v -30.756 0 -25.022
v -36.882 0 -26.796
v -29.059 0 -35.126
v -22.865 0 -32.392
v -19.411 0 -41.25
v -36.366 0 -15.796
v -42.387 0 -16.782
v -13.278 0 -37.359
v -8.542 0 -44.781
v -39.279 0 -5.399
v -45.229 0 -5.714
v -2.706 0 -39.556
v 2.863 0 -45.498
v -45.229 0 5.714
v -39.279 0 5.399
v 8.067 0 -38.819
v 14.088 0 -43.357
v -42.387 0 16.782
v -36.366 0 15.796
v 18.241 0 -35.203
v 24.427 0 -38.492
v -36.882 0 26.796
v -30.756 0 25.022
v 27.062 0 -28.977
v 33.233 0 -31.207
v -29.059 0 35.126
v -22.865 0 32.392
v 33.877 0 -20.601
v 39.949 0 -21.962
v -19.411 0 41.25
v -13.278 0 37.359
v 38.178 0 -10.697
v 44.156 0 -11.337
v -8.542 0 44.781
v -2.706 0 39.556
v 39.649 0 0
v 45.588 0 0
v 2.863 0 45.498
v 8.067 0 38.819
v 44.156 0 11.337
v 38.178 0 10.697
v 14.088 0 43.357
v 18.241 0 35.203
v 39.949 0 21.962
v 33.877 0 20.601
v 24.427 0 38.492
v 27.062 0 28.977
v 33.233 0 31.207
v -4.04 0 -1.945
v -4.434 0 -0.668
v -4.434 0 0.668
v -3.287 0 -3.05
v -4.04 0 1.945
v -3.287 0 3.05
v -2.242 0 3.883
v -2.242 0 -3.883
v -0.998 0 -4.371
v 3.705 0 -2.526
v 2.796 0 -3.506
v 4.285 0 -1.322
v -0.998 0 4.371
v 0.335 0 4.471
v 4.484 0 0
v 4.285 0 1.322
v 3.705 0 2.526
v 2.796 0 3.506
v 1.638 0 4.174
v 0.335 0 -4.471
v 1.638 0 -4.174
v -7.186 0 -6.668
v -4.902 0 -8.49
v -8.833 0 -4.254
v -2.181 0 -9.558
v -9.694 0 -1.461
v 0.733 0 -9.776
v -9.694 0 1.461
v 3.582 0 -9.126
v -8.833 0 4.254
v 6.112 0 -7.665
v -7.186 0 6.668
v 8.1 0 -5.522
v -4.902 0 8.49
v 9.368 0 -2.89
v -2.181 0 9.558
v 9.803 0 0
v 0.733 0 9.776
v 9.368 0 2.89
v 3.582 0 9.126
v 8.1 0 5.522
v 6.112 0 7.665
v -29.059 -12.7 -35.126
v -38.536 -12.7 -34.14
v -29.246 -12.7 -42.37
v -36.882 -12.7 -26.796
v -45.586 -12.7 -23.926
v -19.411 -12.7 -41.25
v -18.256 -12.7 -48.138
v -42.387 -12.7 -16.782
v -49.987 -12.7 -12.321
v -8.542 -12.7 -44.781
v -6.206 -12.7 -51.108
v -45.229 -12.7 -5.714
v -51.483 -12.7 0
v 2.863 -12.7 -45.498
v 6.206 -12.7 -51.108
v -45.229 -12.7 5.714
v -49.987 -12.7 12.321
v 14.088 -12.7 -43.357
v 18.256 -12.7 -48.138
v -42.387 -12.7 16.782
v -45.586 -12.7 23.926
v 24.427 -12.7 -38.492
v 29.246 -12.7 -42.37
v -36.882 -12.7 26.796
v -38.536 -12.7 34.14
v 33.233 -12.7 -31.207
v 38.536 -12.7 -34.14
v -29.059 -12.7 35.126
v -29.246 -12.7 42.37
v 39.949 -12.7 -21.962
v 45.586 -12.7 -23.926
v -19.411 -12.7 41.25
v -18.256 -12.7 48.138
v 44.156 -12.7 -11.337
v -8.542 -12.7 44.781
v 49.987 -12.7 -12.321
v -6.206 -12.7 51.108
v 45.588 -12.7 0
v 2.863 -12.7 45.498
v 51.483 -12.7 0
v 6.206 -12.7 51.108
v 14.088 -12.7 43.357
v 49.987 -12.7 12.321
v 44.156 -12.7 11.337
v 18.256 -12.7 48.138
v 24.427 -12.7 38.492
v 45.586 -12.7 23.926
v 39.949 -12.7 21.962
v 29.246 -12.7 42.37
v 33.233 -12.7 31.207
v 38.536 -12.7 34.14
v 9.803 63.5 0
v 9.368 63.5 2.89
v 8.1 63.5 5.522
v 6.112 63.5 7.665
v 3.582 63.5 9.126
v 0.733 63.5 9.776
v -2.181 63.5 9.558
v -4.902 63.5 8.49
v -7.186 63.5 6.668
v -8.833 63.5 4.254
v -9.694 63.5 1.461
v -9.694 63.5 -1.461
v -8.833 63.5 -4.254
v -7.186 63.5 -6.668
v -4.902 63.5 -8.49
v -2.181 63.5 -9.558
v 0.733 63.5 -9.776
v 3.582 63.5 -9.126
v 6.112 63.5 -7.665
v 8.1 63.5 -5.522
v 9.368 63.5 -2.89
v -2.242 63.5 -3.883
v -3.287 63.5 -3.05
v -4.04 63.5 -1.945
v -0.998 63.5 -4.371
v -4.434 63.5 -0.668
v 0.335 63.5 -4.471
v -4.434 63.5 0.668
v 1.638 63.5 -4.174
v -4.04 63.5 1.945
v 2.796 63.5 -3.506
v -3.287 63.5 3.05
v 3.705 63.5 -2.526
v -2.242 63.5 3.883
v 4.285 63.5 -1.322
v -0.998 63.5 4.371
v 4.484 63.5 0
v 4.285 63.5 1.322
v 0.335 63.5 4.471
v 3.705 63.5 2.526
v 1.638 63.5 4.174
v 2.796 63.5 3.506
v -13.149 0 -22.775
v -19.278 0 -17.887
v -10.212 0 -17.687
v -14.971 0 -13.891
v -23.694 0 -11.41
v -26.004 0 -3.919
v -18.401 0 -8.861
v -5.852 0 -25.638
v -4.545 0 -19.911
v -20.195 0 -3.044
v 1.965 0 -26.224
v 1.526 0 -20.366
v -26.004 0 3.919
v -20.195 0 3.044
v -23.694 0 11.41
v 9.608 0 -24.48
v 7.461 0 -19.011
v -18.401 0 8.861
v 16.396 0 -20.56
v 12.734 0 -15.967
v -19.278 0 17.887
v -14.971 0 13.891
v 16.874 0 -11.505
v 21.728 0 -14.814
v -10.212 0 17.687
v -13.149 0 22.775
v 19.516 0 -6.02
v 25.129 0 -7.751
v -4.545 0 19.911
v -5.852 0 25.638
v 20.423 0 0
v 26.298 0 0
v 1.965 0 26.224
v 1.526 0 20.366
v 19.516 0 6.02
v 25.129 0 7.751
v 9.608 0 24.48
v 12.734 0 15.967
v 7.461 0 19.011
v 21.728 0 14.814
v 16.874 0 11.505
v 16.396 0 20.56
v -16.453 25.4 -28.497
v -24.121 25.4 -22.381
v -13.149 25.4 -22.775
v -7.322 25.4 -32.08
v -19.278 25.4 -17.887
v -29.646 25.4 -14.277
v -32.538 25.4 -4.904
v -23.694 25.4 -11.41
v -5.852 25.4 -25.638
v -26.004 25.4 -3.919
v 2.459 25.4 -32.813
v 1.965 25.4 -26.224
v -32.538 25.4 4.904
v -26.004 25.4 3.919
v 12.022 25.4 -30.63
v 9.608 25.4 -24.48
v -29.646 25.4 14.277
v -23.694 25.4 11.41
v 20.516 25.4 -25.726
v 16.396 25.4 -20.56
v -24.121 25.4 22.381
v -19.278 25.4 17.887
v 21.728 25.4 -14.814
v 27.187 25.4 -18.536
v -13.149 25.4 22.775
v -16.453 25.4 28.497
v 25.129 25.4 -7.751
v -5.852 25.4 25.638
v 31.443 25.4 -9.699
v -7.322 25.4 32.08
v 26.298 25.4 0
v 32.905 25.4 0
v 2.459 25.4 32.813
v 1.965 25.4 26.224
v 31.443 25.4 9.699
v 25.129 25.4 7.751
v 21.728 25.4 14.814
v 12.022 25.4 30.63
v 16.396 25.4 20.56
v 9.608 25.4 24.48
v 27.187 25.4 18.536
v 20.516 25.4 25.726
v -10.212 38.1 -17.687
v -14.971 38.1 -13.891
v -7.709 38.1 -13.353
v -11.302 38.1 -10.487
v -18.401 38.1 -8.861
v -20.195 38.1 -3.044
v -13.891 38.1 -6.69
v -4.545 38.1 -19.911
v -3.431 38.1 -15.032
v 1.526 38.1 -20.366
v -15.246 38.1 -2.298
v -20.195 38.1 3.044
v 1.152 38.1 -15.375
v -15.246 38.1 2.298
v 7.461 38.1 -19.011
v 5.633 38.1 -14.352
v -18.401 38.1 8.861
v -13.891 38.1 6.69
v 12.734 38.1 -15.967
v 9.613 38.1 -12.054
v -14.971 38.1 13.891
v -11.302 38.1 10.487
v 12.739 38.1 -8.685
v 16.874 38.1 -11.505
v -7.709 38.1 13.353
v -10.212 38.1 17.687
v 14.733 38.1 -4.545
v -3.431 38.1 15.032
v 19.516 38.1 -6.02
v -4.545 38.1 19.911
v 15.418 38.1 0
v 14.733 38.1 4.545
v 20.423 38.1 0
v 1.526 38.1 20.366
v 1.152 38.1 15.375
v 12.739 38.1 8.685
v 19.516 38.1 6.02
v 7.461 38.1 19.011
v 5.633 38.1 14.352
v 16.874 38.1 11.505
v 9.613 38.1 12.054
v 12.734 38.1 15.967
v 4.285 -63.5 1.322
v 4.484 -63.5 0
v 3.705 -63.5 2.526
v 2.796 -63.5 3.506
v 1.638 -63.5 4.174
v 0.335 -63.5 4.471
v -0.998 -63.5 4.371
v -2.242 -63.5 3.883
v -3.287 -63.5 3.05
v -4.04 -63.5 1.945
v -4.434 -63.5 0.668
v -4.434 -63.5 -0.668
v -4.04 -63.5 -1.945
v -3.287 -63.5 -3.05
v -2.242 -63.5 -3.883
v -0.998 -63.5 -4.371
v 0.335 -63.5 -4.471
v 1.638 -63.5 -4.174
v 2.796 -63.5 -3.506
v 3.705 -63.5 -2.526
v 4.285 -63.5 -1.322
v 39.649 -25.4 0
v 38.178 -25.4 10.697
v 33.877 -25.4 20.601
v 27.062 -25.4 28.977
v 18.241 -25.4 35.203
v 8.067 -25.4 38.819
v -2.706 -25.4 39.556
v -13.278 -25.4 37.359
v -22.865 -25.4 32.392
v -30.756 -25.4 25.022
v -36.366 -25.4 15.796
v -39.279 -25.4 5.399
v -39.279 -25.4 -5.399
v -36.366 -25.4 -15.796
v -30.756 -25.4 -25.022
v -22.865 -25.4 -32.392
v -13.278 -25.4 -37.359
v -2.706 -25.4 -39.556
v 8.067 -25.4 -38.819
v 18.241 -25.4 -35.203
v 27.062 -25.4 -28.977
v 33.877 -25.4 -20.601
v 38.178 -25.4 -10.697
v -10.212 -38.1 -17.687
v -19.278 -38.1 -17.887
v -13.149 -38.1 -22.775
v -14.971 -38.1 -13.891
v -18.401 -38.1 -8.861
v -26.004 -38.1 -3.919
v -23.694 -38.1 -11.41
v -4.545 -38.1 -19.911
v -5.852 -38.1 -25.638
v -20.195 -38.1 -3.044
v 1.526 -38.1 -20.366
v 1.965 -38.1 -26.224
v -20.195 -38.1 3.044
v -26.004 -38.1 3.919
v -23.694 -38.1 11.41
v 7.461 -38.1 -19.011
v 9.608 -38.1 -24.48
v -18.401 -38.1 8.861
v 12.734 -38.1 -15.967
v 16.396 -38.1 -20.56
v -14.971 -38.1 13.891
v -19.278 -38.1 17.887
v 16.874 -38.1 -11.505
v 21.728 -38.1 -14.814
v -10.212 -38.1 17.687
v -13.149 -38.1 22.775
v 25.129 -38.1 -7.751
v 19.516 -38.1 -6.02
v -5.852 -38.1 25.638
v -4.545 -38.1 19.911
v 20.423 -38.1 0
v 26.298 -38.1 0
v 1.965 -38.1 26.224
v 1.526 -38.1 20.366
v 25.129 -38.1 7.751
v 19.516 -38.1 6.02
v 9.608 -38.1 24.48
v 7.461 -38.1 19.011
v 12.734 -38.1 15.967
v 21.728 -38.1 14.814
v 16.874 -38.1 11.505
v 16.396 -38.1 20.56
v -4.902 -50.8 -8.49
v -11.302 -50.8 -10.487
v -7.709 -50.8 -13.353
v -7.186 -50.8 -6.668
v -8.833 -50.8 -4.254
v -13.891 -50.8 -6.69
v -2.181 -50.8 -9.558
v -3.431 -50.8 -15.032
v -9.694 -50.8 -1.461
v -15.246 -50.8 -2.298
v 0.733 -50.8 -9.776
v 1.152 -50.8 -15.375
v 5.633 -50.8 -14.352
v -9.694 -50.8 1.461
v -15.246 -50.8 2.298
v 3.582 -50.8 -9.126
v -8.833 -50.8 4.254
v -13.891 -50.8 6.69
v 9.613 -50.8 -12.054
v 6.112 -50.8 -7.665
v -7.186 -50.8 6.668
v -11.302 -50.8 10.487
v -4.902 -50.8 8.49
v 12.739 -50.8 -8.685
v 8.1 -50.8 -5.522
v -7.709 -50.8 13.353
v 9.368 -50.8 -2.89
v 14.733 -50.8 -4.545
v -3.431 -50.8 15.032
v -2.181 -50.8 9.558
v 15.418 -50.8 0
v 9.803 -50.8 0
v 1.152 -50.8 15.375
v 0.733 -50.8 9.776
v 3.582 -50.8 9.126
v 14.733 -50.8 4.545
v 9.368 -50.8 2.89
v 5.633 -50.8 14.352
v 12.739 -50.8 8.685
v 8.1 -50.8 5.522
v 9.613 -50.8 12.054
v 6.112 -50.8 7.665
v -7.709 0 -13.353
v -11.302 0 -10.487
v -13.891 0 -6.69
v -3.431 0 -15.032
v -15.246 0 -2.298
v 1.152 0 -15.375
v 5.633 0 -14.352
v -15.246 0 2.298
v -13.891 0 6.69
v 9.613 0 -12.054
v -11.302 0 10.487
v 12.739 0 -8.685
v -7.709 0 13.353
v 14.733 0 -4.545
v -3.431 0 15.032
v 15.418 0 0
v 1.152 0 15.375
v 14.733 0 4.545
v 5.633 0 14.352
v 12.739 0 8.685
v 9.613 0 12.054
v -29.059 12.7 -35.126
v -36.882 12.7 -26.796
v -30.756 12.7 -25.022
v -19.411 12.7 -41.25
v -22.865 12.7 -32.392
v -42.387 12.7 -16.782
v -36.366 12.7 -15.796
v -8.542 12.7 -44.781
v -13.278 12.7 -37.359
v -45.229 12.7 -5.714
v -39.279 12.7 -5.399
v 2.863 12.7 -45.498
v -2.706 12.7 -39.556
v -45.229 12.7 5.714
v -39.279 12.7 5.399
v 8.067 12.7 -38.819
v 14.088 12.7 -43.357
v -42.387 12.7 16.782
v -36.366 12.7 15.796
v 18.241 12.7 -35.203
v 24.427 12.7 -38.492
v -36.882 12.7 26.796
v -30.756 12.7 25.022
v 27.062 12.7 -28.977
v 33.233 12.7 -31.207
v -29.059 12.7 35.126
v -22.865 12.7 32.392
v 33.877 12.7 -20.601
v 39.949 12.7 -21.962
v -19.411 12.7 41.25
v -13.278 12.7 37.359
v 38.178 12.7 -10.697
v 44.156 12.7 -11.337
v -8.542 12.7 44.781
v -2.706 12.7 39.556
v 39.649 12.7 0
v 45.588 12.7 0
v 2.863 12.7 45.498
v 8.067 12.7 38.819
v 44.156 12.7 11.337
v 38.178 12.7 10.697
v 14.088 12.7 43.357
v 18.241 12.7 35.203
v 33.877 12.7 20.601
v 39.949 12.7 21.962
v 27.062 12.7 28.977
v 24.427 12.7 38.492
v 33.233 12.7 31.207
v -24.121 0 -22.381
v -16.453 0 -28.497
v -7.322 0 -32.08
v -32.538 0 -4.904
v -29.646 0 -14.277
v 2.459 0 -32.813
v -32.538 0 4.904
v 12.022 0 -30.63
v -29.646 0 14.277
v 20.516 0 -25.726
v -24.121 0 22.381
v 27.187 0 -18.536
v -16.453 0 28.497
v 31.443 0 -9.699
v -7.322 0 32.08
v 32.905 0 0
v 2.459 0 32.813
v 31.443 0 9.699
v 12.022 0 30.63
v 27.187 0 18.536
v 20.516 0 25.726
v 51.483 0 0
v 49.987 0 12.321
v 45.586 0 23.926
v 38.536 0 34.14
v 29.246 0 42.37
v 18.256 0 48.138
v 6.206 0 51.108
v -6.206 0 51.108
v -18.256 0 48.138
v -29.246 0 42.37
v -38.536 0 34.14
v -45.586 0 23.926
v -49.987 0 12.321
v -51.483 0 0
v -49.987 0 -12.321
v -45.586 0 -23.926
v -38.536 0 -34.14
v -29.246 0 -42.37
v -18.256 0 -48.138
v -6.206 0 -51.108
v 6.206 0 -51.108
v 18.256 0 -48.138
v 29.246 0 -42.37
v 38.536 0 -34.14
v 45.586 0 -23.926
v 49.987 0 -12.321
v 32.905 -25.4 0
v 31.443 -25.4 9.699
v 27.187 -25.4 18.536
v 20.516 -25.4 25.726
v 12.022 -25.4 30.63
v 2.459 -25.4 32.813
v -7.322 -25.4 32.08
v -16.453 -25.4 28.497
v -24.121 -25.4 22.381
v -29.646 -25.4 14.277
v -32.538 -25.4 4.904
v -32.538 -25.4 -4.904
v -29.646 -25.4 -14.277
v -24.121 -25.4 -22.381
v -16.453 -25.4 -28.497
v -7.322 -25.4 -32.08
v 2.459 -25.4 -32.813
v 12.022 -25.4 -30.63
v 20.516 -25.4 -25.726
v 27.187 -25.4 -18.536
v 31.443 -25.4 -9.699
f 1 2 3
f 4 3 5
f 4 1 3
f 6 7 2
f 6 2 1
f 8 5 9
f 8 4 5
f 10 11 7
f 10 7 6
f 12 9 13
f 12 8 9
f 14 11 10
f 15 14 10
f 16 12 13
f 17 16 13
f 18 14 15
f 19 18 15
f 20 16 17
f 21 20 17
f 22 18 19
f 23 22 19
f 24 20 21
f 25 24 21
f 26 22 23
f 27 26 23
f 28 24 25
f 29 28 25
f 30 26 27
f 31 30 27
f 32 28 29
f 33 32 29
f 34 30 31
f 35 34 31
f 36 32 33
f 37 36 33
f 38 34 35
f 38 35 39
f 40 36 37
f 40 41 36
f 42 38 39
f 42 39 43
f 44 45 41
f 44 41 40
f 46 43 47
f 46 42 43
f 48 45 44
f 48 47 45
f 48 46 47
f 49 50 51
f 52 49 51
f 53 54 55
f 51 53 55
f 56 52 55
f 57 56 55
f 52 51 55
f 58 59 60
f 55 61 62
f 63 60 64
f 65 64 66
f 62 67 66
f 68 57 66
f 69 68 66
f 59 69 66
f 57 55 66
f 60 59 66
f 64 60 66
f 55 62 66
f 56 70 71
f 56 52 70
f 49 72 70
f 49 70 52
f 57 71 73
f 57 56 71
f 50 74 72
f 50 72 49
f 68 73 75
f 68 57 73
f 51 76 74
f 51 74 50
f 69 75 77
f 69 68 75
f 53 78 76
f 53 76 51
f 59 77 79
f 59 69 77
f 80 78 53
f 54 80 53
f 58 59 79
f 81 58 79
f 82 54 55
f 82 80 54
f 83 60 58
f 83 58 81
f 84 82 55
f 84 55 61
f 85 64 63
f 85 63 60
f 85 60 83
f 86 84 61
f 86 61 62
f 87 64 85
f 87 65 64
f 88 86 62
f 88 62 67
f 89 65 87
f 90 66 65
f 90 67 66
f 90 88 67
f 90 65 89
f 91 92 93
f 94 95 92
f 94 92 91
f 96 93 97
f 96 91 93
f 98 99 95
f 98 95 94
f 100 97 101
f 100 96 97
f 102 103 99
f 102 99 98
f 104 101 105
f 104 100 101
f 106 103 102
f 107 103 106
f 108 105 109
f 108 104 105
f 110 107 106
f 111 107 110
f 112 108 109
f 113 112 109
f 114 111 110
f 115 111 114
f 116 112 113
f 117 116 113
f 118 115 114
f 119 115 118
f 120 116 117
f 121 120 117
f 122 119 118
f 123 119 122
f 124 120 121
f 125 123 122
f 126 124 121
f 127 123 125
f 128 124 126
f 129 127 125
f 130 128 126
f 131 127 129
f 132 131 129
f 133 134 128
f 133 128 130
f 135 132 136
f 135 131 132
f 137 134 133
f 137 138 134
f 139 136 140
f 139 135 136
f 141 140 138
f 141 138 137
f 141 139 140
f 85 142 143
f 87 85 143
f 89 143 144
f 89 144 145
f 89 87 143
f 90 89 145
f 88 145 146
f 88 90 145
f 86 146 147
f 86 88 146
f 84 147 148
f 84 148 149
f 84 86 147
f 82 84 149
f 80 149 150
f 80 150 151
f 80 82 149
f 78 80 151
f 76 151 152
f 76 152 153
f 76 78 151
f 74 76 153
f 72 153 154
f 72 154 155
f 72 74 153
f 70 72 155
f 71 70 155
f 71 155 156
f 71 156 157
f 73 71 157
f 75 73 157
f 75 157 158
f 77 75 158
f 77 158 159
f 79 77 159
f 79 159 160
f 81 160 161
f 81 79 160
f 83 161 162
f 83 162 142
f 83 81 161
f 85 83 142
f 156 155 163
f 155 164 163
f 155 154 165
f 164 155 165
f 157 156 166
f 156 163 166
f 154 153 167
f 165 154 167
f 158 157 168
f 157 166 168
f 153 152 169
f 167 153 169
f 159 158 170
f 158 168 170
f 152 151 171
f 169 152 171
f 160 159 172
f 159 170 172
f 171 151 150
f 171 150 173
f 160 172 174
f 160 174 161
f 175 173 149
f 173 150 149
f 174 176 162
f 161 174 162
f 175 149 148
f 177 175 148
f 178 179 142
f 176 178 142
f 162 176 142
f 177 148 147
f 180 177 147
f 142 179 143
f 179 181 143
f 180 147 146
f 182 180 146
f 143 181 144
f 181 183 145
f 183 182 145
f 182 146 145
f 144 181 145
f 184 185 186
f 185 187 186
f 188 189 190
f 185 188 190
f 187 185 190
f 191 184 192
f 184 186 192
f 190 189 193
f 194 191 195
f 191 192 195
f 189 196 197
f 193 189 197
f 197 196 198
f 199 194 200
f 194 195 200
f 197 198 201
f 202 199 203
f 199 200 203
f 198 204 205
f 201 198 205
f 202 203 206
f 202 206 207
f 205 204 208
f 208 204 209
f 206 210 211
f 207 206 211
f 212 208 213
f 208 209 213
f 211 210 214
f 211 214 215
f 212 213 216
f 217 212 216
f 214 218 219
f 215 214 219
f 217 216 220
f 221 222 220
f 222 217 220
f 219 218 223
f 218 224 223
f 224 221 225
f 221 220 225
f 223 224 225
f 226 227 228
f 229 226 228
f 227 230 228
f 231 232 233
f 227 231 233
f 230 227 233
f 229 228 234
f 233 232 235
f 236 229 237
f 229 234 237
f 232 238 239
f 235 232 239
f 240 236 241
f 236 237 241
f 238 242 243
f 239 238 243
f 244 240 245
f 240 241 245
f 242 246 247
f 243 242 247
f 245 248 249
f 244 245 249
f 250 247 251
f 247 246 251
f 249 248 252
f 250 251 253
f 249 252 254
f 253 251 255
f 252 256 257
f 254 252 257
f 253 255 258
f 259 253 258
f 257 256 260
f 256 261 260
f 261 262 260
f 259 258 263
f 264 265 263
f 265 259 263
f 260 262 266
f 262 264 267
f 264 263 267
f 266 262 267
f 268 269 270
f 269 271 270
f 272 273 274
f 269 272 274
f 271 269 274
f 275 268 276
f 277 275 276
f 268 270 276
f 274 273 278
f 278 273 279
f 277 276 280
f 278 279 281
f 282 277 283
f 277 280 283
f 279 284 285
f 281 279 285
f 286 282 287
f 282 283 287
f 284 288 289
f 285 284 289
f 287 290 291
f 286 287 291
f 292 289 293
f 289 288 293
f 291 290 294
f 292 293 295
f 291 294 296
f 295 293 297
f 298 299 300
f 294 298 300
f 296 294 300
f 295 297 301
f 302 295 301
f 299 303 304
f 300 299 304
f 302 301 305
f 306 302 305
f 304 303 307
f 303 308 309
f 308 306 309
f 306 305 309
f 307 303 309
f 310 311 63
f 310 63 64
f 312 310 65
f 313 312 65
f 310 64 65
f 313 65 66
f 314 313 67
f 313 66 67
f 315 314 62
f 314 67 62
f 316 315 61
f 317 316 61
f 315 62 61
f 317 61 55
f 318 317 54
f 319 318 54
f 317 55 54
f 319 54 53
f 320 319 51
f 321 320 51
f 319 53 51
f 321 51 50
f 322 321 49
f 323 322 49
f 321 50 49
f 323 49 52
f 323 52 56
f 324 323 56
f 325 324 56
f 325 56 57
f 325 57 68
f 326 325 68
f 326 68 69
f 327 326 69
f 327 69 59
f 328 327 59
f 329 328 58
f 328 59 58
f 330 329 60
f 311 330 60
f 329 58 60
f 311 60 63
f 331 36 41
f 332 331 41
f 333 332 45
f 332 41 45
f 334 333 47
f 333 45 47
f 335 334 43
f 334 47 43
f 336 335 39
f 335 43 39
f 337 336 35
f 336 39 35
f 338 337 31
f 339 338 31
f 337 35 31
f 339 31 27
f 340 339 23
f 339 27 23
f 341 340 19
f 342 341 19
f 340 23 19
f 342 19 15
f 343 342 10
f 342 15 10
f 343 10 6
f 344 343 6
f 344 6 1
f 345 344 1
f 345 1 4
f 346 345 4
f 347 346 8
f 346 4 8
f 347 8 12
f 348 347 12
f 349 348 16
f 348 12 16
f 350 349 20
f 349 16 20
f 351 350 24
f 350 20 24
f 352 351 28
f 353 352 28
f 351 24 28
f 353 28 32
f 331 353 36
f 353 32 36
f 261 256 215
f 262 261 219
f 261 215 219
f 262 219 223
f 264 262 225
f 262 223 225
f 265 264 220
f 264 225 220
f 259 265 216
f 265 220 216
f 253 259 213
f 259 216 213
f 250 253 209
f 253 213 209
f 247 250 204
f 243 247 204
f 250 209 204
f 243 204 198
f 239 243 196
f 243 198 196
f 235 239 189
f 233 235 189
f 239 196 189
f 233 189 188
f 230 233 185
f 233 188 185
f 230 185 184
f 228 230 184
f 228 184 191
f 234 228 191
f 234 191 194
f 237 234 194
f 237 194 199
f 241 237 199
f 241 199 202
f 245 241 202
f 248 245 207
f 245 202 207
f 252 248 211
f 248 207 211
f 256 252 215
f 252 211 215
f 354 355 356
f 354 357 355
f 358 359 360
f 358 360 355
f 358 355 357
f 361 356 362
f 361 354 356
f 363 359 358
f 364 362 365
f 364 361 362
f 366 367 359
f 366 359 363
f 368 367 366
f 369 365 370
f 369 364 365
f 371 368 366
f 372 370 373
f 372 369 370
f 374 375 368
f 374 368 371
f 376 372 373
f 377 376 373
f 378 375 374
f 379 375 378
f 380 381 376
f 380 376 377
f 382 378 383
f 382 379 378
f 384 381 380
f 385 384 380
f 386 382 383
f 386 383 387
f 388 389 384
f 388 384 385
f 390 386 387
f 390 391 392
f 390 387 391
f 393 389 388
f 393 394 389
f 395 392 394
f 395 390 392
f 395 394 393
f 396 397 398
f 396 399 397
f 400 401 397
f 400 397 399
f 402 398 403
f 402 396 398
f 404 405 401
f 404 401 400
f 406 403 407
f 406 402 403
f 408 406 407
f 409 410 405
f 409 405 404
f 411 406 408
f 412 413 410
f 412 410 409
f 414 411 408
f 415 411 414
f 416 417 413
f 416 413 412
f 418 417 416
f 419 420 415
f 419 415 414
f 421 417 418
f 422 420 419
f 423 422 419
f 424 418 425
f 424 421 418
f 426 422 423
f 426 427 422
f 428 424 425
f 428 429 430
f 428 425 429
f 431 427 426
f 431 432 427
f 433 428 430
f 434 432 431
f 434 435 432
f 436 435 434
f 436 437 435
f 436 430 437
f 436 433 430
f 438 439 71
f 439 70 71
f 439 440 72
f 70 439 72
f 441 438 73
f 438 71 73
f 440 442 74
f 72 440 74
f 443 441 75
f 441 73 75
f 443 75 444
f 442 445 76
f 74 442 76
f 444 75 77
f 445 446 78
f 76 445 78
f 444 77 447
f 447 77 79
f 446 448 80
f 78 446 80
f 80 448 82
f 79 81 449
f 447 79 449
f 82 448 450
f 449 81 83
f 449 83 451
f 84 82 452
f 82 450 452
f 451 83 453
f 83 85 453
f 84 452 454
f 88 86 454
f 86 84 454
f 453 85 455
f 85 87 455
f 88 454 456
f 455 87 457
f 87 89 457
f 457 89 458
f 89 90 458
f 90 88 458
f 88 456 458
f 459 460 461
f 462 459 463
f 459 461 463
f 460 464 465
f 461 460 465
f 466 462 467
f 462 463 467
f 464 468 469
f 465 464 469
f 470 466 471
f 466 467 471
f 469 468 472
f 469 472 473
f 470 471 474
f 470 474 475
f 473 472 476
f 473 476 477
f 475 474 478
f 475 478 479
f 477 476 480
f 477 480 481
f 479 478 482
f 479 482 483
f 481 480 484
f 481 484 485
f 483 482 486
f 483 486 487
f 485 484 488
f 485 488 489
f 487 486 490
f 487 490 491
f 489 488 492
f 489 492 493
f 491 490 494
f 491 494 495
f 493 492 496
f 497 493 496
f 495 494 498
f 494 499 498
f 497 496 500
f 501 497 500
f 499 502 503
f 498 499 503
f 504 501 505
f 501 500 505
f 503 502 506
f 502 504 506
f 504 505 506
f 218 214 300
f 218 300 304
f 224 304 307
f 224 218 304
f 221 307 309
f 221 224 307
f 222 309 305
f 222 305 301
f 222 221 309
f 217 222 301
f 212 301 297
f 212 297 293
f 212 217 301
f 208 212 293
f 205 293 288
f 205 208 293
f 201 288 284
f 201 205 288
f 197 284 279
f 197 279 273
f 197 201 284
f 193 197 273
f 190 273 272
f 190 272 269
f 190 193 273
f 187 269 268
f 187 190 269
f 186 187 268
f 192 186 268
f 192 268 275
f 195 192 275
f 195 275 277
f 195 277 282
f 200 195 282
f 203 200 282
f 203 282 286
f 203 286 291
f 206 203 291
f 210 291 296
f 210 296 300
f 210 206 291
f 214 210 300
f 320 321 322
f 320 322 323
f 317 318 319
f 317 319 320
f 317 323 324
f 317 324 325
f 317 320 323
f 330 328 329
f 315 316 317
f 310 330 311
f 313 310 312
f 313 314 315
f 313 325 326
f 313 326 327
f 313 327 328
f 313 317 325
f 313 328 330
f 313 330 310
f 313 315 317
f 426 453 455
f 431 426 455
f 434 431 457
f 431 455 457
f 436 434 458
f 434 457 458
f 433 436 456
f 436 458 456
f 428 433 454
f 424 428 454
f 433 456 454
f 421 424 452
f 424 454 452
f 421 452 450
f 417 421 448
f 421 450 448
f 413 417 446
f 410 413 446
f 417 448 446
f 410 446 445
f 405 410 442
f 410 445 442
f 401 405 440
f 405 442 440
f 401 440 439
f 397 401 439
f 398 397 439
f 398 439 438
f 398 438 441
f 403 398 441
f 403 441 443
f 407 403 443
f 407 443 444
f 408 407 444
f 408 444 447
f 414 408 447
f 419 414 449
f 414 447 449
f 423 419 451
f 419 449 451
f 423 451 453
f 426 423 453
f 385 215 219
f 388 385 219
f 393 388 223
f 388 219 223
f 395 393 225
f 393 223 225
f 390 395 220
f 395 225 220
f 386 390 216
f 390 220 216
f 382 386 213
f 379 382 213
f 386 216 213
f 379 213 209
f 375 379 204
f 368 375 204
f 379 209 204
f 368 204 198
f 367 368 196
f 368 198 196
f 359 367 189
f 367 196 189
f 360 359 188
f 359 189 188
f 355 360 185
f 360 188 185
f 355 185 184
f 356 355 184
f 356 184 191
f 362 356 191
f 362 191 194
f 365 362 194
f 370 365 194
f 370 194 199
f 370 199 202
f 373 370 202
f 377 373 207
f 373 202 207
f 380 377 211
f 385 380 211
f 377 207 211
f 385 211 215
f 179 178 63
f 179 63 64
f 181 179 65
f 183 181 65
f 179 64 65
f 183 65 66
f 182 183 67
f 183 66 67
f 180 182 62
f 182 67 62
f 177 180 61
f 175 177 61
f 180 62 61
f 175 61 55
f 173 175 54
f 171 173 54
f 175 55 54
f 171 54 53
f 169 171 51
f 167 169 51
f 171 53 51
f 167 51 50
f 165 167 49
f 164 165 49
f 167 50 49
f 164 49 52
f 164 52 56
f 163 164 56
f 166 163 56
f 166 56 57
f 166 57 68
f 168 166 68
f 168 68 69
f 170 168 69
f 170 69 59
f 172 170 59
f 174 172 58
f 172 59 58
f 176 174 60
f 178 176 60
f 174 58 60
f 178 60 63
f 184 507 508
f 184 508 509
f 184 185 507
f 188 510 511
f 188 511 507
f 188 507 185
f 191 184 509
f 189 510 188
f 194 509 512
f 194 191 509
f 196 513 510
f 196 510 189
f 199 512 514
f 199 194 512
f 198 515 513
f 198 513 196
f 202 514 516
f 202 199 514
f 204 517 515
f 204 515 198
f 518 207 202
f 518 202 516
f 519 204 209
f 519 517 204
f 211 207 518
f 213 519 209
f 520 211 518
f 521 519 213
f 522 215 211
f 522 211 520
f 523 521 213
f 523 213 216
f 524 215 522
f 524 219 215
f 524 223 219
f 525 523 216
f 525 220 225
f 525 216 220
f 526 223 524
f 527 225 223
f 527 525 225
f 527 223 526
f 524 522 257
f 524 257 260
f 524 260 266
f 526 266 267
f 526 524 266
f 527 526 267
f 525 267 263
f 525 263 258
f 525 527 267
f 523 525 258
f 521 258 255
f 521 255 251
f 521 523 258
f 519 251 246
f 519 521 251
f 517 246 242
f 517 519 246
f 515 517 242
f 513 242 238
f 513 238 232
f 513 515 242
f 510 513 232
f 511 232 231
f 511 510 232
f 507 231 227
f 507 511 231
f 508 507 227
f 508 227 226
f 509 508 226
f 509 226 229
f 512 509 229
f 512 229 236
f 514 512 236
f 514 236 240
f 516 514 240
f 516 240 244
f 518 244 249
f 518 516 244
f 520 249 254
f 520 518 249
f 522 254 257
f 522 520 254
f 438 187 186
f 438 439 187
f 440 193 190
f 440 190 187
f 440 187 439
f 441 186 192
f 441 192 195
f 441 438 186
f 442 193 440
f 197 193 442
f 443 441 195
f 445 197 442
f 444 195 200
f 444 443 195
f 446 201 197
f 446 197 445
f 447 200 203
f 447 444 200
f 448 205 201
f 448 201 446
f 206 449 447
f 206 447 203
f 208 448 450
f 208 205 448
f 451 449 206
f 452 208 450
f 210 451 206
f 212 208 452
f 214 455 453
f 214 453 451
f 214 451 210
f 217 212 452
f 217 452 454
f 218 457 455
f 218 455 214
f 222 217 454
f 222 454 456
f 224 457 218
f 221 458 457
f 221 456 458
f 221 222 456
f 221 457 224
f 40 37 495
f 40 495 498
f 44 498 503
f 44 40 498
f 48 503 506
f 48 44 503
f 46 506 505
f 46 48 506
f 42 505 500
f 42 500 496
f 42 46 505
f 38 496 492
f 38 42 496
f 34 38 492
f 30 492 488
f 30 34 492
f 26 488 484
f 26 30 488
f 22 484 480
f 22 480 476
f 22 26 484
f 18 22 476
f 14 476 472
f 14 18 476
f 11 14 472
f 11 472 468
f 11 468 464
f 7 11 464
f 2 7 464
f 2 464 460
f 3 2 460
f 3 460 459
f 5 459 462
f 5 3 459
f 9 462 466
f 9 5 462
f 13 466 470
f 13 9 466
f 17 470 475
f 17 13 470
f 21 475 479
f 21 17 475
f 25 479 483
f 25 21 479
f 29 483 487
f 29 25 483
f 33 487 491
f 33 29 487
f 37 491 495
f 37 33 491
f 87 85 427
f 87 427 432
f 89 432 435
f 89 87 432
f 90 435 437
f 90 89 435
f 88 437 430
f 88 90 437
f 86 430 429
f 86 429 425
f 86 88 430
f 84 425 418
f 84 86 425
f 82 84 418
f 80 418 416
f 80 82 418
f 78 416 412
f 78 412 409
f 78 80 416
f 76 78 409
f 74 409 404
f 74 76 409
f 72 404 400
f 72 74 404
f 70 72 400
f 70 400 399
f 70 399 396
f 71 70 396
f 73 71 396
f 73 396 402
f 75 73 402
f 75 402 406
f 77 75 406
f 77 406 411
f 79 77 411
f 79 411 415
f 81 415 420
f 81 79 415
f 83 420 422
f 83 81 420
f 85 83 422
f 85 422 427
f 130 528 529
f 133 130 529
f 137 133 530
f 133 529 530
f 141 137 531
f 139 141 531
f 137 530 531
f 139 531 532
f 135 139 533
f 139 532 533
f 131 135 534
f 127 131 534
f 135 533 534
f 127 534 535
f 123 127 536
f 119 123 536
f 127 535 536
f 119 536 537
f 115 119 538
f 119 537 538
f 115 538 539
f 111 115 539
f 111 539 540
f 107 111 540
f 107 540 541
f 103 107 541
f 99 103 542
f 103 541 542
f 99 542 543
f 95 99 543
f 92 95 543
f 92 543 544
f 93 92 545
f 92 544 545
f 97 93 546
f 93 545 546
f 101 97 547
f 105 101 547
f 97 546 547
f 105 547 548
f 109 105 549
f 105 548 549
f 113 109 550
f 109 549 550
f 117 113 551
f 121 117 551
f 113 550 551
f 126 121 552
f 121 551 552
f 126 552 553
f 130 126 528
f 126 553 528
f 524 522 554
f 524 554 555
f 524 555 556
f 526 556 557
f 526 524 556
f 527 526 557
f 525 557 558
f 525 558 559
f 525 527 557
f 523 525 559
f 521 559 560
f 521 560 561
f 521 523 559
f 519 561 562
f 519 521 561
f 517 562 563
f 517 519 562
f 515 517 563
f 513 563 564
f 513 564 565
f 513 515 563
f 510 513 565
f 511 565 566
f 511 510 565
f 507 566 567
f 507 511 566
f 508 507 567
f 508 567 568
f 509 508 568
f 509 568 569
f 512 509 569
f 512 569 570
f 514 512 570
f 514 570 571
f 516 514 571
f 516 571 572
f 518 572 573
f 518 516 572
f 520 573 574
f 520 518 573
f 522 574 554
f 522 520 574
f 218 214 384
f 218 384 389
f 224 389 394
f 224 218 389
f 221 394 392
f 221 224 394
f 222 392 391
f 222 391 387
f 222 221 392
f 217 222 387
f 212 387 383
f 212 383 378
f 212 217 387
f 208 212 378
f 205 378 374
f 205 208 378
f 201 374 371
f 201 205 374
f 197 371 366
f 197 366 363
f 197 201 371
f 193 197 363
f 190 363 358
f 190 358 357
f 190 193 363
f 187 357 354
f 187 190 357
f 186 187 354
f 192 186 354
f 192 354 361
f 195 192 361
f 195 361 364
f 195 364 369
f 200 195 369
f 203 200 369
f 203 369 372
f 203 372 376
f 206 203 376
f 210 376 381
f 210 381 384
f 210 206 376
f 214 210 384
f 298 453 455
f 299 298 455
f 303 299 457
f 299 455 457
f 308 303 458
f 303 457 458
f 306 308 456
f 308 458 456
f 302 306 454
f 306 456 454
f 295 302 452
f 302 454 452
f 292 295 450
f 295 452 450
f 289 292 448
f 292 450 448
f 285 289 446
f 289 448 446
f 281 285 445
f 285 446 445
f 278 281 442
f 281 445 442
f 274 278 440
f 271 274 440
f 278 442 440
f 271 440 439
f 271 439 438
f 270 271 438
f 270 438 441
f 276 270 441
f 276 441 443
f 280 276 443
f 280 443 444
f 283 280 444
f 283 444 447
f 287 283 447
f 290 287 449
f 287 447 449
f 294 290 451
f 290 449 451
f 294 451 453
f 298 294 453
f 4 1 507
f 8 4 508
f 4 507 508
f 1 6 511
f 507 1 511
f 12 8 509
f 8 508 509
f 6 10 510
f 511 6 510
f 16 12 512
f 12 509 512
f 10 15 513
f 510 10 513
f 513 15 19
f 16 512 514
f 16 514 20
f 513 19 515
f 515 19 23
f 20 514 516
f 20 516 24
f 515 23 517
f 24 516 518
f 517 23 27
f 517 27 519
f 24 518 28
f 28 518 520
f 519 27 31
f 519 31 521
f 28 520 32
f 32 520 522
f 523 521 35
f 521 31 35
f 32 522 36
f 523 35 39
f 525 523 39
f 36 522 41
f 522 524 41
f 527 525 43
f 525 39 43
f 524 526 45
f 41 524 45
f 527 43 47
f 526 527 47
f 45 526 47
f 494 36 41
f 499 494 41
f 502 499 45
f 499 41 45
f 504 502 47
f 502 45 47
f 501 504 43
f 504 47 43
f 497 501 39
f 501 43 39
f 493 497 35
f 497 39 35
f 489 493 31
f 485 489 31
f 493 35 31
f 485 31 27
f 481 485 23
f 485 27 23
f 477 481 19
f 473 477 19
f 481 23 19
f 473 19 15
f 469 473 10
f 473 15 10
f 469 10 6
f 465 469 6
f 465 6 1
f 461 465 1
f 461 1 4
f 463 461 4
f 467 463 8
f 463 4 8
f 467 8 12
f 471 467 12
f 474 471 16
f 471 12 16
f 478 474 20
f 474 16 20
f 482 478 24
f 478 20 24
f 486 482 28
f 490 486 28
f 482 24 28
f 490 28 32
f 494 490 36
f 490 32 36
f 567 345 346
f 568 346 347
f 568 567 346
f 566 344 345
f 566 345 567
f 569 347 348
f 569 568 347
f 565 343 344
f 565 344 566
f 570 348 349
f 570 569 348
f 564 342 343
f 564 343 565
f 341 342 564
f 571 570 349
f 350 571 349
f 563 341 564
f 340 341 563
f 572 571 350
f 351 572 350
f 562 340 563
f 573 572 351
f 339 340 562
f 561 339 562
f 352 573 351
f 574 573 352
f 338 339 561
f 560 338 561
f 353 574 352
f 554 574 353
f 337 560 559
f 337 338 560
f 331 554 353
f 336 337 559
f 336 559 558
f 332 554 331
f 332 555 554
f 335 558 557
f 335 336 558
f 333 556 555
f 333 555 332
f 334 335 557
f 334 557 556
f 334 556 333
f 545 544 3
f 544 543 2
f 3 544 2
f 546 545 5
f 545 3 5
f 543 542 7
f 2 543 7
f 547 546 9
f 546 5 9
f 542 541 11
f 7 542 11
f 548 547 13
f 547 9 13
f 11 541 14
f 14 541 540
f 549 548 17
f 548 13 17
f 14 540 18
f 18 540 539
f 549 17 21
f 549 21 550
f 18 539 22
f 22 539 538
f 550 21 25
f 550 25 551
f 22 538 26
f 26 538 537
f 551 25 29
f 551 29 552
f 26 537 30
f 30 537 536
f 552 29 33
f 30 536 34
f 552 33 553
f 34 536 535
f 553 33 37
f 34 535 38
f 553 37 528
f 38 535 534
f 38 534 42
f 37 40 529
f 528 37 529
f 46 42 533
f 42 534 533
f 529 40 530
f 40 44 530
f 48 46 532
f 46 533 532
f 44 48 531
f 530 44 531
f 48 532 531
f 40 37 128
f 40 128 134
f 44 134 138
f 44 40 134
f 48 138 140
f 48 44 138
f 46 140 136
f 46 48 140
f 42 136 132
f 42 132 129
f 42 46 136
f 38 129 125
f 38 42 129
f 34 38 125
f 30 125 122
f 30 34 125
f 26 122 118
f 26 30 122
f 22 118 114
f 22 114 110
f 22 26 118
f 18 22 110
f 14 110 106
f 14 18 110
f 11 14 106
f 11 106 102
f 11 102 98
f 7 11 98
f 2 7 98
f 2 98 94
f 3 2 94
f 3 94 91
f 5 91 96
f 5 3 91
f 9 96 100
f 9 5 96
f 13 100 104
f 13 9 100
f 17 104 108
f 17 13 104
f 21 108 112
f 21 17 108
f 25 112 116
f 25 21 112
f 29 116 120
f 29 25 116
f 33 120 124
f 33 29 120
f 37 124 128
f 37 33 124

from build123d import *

# Parameters (mm, degrees)
F0_R     = 51.483445
F0_R_2   = 45.588391
F1_DEPTH = 12.7
F0_R_3   = 39.648593
F2_DEPTH = 12.7
F0_R_4   = 32.905103
F3_DEPTH = 25.4
F0_R_5   = 26.297839
F4_DEPTH = 25.4
F0_R_6   = 20.423084
F5_DEPTH = 38.1
F0_R_7   = 15.418276
F6_DEPTH = 38.1
F0_R_8   = 9.803339
F7_DEPTH = 50.8
F0_R_9   = 4.483729
F8_DEPTH = 63.5
F9_DEPTH = 63.5


with BuildPart() as f1:
    # F0 (on Front) → F1 (new body)
    with BuildSketch(Plane.XZ):
        Circle(F0_R)
        Circle(F0_R_2, mode=Mode.SUBTRACT)
    extrude(amount=F1_DEPTH)


with BuildPart() as f2:
    # F0 (on Front) → F2 (new body)
    with BuildSketch(Plane.XZ):
        Circle(F0_R_2)
        Circle(F0_R_3, mode=Mode.SUBTRACT)
    extrude(amount=-F2_DEPTH)


with BuildPart() as f3:
    # F0 (on Front) → F3 (new body)
    with BuildSketch(Plane.XZ):
        Circle(F0_R_3)
        Circle(F0_R_4, mode=Mode.SUBTRACT)
    extrude(amount=F3_DEPTH)

    # F0 (on Front) → F4 (join)
    with BuildSketch(Plane.XZ):
        Circle(F0_R_4)
        Circle(F0_R_5, mode=Mode.SUBTRACT)
    extrude(amount=-F4_DEPTH)


with BuildPart() as f5:
    # F0 (on Front) → F5 (new body)
    with BuildSketch(Plane.XZ):
        Circle(F0_R_5)
        Circle(F0_R_6, mode=Mode.SUBTRACT)
    extrude(amount=F5_DEPTH)

    # F0 (on Front) → F6 (join)
    with BuildSketch(Plane.XZ):
        Circle(F0_R_6)
        Circle(F0_R_7, mode=Mode.SUBTRACT)
    extrude(amount=-F6_DEPTH)


with BuildPart() as f7:
    # F0 (on Front) → F7 (new body)
    with BuildSketch(Plane.XZ):
        Circle(F0_R_7)
        Circle(F0_R_8, mode=Mode.SUBTRACT)
    extrude(amount=F7_DEPTH)

    # F0 (on Front) → F8 (join)
    with BuildSketch(Plane.XZ):
        Circle(F0_R_8)
        Circle(F0_R_9, mode=Mode.SUBTRACT)
    extrude(amount=-F8_DEPTH)


with BuildPart() as f9:
    # F0 (on Front) → F9 (new body)
    with BuildSketch(Plane.XZ):
        Circle(F0_R_9)
    extrude(amount=F9_DEPTH)


solid = Compound([f1.part, f2.part, f3.part, f5.part, f7.part, f9.part])
